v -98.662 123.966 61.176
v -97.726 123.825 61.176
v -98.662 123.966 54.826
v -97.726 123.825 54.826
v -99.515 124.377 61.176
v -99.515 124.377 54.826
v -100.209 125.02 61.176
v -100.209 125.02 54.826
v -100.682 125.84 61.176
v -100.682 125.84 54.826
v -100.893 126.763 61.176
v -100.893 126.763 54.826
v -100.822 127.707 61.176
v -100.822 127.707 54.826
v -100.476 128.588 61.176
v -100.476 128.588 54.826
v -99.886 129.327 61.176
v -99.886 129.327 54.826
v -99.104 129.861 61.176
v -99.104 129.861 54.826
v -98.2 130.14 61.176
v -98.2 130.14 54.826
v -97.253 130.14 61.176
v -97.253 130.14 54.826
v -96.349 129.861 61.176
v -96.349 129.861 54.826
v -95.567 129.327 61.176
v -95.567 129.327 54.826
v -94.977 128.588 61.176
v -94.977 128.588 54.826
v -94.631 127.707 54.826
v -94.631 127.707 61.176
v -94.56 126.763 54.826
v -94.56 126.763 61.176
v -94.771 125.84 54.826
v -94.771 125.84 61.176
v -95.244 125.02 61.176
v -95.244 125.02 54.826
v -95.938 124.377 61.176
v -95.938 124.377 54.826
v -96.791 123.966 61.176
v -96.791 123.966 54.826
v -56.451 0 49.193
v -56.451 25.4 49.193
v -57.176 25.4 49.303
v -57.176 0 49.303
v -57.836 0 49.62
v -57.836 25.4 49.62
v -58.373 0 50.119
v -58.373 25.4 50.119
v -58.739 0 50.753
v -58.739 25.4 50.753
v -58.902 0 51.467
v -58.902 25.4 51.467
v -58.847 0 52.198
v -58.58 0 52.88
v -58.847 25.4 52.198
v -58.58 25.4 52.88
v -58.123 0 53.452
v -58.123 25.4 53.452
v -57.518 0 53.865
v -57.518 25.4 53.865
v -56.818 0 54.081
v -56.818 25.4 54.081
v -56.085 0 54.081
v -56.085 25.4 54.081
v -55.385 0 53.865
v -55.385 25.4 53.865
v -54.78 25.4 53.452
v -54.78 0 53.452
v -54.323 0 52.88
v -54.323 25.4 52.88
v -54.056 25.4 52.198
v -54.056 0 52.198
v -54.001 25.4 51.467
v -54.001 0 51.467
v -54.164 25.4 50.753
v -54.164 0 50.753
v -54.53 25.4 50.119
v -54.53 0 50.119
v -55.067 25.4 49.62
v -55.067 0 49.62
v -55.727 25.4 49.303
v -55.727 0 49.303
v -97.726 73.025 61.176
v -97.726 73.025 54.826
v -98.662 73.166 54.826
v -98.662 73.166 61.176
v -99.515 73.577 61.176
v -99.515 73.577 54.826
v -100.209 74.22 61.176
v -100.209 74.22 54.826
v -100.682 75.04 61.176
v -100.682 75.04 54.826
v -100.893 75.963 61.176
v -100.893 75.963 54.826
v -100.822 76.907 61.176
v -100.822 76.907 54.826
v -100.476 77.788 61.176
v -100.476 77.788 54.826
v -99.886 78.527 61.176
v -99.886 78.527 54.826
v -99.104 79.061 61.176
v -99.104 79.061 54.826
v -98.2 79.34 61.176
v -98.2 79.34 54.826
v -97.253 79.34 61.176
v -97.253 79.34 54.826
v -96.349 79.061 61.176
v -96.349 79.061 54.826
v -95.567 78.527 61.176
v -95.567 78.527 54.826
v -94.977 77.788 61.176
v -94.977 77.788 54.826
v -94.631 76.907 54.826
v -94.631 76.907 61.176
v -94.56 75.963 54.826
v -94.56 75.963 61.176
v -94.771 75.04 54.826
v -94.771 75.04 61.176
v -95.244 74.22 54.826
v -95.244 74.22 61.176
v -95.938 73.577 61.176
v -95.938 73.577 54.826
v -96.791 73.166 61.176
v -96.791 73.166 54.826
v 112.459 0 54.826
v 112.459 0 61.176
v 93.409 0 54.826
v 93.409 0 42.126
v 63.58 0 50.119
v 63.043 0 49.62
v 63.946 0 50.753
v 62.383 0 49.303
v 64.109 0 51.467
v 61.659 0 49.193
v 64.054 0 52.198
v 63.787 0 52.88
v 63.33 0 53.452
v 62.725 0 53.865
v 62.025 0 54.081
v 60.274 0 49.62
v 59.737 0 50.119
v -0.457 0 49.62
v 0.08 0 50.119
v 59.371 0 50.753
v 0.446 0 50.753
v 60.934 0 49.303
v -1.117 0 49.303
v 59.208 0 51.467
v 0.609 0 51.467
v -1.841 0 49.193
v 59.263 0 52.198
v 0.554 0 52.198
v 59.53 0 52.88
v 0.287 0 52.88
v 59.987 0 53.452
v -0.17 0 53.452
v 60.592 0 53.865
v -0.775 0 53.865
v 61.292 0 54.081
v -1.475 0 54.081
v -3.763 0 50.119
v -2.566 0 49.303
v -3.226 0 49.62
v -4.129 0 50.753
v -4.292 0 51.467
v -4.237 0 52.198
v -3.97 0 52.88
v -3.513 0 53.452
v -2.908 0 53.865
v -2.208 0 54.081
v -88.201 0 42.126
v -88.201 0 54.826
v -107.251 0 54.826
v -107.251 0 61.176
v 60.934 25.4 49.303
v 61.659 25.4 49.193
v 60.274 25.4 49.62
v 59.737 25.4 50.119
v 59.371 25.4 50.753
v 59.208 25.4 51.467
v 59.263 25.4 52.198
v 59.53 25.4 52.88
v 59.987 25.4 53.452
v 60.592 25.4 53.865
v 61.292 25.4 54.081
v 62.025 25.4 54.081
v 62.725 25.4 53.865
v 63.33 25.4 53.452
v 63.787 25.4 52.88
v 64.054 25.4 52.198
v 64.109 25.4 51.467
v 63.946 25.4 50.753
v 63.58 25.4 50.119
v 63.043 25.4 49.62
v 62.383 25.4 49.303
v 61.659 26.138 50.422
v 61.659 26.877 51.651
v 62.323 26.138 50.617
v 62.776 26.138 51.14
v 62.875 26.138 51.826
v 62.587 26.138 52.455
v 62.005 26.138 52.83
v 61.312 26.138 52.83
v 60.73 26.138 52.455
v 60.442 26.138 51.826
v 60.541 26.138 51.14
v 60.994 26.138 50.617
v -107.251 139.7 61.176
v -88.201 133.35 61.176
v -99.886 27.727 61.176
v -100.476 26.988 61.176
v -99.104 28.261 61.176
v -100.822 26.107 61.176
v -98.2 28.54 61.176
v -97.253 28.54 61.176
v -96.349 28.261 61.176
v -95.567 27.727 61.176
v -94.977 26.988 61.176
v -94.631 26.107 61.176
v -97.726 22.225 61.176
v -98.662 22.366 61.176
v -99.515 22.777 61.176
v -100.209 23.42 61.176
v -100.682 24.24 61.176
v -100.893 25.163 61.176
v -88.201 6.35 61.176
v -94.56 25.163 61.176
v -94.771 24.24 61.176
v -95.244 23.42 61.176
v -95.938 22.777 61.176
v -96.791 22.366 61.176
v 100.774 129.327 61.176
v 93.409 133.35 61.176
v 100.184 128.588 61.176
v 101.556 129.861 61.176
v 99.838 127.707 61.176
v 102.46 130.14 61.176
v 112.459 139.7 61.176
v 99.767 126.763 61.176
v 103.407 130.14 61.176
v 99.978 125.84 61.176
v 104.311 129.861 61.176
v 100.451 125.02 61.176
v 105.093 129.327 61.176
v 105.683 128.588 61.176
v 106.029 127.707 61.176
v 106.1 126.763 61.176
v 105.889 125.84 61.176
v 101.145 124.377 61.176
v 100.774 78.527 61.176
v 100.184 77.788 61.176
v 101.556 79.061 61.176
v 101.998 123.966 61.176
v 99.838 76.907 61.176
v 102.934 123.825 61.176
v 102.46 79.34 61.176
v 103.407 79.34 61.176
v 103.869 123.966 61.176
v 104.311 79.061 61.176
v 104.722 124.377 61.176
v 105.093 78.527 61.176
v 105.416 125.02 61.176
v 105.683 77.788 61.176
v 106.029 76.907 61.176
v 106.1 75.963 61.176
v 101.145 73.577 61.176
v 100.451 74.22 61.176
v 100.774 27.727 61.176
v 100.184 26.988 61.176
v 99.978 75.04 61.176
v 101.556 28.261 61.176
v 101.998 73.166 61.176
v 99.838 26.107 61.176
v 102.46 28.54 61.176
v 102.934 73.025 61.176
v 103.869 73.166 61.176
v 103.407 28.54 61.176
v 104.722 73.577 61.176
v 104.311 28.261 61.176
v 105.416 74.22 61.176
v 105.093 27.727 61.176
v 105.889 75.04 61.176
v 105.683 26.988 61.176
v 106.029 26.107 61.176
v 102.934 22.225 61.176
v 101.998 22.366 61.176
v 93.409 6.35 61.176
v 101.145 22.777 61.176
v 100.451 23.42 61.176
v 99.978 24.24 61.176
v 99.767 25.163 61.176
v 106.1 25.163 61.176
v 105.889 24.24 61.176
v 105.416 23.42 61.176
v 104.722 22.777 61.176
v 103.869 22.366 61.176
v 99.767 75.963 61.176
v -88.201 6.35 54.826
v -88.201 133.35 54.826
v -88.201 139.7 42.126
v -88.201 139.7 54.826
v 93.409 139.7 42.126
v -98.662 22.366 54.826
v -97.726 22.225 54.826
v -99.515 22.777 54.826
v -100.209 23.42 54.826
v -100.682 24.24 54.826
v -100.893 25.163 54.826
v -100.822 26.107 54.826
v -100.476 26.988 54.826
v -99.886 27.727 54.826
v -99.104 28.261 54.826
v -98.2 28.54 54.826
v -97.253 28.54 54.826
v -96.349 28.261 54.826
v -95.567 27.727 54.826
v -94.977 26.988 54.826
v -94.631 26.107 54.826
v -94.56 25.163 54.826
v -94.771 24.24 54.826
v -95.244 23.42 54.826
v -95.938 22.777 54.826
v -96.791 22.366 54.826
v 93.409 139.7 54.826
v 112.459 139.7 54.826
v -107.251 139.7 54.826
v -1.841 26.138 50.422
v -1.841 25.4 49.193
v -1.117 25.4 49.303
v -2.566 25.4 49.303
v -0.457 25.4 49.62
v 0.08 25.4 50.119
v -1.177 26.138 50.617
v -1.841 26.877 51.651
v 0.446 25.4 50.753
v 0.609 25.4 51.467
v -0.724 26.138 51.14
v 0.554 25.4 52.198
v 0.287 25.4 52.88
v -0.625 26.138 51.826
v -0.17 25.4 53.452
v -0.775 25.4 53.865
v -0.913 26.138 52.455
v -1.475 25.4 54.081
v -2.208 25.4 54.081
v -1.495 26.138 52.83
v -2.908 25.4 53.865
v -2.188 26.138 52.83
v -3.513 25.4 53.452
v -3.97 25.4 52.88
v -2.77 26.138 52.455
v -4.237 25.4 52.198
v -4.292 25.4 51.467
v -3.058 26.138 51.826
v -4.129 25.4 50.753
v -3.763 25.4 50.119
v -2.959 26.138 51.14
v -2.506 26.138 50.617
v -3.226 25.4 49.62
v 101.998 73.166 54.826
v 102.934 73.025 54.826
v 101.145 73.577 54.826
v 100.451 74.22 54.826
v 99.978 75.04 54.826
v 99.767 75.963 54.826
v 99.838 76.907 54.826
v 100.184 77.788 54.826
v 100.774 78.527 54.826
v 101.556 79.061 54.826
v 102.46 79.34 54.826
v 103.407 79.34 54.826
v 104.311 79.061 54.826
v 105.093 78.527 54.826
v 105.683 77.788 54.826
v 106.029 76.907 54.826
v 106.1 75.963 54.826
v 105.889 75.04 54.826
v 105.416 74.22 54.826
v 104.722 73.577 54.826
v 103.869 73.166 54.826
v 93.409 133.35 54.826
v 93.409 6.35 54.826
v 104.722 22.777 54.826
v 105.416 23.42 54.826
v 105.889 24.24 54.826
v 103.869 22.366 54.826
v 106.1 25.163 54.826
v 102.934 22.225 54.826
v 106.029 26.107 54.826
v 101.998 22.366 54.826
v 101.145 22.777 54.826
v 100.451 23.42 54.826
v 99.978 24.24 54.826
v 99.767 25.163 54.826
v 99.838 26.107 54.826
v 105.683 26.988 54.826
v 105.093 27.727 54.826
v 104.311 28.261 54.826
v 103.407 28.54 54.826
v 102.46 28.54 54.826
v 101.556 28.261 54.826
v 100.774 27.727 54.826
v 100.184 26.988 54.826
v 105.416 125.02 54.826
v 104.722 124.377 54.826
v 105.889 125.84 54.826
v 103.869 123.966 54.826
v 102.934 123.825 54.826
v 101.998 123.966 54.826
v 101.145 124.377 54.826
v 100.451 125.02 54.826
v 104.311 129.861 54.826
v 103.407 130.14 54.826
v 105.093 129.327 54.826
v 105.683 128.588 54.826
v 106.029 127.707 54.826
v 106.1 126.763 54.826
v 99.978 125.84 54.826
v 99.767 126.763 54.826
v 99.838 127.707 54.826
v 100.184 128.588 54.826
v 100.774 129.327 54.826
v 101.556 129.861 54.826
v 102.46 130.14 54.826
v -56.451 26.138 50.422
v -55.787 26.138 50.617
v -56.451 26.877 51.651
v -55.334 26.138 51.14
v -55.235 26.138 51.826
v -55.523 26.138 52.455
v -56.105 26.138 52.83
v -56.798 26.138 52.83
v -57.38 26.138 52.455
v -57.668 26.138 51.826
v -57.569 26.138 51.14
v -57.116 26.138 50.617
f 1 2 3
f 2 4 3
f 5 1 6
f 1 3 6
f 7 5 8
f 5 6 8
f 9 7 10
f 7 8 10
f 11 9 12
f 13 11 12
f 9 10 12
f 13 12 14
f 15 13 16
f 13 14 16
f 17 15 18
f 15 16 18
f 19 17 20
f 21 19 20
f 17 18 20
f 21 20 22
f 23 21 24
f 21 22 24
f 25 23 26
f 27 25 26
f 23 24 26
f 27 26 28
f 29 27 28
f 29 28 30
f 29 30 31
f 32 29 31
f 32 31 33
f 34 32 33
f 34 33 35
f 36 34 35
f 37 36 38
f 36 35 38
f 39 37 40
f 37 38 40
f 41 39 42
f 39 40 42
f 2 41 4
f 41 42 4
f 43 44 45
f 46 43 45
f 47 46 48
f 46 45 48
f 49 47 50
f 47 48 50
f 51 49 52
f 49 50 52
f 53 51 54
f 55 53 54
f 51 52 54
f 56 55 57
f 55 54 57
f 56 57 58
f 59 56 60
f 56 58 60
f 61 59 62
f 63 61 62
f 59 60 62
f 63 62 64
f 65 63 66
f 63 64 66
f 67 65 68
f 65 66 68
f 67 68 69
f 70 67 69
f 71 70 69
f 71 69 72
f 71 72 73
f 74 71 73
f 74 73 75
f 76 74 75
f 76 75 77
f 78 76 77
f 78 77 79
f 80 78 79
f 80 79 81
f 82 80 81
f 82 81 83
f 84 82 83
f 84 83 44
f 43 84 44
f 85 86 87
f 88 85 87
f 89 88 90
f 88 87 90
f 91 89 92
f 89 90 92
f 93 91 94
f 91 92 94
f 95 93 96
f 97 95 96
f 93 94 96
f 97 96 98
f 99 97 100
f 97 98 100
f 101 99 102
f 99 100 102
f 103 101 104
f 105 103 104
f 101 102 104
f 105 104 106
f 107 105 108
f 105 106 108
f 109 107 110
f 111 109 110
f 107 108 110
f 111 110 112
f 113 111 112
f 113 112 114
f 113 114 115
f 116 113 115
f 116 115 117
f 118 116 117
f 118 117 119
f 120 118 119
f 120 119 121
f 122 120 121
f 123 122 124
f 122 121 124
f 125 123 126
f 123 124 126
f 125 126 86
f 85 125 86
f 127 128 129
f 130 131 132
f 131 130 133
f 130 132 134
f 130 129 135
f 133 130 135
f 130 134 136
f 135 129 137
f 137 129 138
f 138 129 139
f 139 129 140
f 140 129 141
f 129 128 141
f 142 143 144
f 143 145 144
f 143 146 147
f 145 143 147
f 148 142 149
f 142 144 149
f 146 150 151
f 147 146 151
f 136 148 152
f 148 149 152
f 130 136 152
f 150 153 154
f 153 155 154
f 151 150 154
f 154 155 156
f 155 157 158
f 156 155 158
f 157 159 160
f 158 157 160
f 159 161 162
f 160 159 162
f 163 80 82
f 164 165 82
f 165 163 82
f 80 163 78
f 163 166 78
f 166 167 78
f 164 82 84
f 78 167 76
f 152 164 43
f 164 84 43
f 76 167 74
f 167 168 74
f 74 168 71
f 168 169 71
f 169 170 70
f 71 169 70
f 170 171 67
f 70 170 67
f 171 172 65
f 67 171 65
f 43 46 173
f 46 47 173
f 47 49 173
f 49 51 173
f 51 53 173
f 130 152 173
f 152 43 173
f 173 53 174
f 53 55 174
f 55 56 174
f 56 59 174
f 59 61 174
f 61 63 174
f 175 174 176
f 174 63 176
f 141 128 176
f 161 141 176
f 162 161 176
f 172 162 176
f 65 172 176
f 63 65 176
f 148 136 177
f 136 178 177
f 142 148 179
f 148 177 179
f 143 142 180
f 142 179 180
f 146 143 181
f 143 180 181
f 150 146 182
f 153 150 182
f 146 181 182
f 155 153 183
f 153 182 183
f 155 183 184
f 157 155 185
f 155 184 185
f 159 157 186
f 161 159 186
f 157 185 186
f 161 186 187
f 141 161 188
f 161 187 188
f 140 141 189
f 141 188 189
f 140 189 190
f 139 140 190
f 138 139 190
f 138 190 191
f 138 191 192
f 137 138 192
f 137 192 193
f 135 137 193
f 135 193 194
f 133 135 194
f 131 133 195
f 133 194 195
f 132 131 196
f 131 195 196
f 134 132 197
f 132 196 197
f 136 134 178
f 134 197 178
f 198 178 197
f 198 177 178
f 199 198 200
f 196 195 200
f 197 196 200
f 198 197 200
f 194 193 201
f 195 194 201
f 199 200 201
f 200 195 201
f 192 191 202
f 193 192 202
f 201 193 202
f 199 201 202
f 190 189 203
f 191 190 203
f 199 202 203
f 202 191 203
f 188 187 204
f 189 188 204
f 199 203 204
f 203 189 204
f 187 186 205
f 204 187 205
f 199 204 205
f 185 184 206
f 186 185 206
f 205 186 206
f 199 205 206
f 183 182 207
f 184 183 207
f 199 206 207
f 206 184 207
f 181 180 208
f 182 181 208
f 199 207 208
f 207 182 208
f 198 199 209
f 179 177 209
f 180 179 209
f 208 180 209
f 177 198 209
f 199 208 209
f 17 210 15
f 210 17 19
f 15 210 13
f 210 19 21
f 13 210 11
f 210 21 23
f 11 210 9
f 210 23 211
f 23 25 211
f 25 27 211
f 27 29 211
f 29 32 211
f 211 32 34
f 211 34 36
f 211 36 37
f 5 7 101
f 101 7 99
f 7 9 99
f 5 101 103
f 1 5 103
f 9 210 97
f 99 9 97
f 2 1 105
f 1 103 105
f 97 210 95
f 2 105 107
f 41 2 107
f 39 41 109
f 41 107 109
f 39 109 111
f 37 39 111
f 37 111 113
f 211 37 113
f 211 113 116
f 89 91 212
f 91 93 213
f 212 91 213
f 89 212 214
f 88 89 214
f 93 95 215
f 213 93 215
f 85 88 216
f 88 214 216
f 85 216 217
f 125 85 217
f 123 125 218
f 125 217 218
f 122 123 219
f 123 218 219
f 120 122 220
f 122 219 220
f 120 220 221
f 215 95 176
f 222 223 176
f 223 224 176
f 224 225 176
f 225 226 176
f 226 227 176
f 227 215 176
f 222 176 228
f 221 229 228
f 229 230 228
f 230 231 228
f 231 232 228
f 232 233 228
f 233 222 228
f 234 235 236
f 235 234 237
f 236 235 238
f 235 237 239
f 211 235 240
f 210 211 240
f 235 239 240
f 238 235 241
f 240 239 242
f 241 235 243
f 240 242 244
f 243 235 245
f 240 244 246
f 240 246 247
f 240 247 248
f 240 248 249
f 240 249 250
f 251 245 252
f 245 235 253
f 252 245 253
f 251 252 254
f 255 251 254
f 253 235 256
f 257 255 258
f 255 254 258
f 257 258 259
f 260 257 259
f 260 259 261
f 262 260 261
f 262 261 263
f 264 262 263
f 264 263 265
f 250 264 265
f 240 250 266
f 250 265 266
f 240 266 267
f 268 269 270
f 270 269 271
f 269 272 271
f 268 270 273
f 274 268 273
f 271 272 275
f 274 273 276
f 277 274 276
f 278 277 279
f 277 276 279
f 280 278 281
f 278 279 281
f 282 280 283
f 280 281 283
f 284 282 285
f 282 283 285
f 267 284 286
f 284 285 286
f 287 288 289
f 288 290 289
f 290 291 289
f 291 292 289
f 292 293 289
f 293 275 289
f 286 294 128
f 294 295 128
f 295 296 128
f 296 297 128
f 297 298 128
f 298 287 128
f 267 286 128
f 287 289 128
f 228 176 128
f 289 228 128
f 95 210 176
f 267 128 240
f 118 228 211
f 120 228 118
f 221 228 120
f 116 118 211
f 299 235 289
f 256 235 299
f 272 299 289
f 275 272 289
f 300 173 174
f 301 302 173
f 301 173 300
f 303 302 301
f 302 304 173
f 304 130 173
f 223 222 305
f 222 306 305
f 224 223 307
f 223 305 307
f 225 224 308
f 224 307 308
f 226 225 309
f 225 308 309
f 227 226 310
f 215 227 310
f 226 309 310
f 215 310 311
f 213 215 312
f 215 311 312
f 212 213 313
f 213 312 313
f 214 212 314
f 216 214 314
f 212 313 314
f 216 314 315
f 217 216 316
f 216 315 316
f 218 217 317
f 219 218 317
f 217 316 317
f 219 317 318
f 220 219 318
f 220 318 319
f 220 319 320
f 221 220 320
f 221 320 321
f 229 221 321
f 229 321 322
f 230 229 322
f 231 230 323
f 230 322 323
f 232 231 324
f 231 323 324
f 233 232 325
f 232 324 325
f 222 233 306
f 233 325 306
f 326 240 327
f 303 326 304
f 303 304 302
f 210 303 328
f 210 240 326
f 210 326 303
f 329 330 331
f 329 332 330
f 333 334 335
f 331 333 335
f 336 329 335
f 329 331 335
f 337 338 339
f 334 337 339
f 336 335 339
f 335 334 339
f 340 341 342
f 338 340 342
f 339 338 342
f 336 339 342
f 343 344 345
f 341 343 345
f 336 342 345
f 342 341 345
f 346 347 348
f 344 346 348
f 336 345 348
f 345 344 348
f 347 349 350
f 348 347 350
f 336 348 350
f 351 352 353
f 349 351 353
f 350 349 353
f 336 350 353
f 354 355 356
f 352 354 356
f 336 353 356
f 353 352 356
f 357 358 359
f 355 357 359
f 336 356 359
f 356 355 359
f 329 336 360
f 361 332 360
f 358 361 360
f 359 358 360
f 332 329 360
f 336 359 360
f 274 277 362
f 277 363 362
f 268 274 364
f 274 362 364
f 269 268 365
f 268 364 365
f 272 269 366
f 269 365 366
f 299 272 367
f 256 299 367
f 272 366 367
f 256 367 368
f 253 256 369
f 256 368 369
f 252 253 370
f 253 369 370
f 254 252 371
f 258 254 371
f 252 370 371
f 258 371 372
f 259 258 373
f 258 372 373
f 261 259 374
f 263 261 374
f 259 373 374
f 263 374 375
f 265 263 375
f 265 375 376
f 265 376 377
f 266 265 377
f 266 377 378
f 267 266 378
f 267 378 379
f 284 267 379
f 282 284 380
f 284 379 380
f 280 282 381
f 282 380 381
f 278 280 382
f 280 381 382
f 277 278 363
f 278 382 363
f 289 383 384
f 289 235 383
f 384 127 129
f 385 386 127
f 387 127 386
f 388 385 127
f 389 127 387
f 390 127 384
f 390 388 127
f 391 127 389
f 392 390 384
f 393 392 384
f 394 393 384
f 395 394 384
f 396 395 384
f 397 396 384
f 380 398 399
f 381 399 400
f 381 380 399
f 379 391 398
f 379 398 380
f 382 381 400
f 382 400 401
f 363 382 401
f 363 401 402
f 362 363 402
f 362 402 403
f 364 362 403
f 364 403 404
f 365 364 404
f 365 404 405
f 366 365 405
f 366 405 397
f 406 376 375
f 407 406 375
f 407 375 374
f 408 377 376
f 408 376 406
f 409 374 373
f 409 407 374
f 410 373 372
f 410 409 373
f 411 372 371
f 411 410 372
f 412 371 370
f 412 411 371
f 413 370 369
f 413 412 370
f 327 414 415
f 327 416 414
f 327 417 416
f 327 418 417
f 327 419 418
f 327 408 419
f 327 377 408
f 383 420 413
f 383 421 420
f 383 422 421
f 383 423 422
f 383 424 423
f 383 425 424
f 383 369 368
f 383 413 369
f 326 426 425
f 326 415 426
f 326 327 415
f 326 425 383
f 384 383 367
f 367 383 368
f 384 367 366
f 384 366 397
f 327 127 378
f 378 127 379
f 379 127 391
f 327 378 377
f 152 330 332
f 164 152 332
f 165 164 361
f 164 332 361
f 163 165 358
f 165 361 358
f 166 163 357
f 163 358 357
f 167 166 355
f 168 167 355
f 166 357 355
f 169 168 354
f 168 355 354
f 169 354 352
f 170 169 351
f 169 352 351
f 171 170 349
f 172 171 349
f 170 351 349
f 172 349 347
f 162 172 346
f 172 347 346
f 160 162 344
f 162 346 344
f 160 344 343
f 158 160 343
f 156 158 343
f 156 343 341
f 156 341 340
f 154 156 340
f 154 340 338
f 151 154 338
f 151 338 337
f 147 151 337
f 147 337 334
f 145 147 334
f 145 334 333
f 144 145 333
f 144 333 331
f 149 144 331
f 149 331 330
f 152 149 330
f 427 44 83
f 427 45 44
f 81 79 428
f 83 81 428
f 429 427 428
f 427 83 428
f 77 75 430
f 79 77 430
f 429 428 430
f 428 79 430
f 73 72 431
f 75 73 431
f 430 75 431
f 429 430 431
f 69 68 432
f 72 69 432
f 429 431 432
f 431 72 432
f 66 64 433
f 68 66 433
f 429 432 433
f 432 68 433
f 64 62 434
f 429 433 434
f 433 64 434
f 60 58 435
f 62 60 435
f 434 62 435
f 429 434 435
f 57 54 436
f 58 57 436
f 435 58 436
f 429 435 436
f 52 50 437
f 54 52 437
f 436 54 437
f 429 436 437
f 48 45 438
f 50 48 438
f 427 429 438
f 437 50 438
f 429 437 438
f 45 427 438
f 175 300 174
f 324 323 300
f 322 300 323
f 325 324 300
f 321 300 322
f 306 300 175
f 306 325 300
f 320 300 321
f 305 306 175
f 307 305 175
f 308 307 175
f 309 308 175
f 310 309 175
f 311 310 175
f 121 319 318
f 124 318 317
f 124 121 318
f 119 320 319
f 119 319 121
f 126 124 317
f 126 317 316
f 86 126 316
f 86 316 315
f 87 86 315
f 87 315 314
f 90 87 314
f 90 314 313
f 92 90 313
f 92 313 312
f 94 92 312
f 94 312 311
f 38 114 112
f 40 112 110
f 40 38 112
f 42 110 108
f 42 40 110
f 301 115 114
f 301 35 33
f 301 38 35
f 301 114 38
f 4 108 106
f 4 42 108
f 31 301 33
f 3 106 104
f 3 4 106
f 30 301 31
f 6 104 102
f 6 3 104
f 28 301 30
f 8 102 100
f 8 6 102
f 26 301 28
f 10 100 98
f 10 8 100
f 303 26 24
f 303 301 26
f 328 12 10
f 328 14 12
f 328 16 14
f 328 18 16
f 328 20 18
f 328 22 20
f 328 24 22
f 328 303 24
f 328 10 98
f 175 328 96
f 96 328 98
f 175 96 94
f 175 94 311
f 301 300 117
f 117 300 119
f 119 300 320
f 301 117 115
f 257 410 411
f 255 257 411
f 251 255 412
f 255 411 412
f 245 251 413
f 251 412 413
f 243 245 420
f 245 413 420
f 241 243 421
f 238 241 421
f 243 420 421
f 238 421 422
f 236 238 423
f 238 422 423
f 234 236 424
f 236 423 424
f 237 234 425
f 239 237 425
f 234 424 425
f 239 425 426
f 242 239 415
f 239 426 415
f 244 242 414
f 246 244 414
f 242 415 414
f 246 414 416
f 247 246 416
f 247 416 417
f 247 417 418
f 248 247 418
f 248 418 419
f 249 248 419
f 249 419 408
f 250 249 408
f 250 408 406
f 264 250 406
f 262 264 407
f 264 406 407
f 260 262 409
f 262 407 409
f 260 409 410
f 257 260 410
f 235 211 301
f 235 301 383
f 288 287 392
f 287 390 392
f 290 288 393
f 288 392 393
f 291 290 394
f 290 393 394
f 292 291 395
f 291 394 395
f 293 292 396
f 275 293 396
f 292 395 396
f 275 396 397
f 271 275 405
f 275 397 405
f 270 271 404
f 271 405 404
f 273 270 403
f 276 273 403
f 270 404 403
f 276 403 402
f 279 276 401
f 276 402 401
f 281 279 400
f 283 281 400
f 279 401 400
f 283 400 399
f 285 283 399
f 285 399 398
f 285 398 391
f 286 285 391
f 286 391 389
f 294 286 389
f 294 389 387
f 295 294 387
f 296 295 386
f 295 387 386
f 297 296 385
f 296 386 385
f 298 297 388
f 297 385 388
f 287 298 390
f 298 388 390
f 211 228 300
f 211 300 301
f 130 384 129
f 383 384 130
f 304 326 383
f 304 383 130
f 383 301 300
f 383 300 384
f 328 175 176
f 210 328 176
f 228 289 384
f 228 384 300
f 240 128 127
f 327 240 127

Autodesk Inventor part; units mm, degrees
ref_plane "YZ Plane" through (0, 0, 0) normal (1, 0, 0) x (0, 1, 0)
ref_plane "XZ Plane" through (0, 0, 0) normal (0, 1, 0) x (-1, 0, 0)
ref_plane "XY Plane" through (0, 0, 0) normal (0, 0, 1) x (1, 0, 0)
sketch "Sketch1" plane through (0, 0, 0) normal (0, 1, 0) x (-1, 0, 0)
  line L0 (107.2514, 61.1758) -> (-112.4586, 61.1758)
  line L1 (-112.4586, 61.1758) -> (-112.4586, 42.1258)
  line L2 (-112.4586, 42.1258) -> (107.2514, 42.1258)
  line L3 (107.2514, 42.1258) -> (107.2514, 61.1758)
  point P0 (0, 0)
  dimension "d0" = 219.71
  dimension "d1" = 19.05
extrude "Extrusion1" add sketch "Sketch1" along normal blind 139.7
sketch "Sketch2" plane through (-107.2514, 0, 61.1758) normal (0, 0, 1) x (1, 0, 0)
  line L0 (0, 0) -> (219.71, 0) projected
  line L1 (0, 139.7) -> (219.71, 139.7) projected
  line L2 (0, 0) -> (0, 139.7) projected
  line L3 (219.71, 0) -> (219.71, 139.7) projected
  point P0 (107.2514, 0)
  point P1 (9.525, 76.2)
  point P2 (9.525, 25.4)
  point P3 (210.185, 25.4)
  point P4 (210.185, 76.2)
  dimension "d4" = 0
  dimension "d5" = 0
  dimension "d6" = 0
  dimension "d7" = 0
  dimension "d8" = 25.4
  dimension "d10" = 9.525
  dimension "d11" = 9.525
  dimension "d57" = 50.8
hole "Hole1" at (-97.7264, 76.2, 61.1758) at (-97.7264, 25.4, 61.1758) at (102.9336, 25.4, 61.1758) at (102.9336, 76.2, 61.1758) direction (0, 0, -1) diameter 6.35 end through all
sketch "Sketch3" plane through (-107.2514, 0, 61.1758) normal (0, 0, 1) x (1, 0, 0)
  line L0 (19.05, 133.35) -> (200.66, 133.35)
  line L1 (200.66, 133.35) -> (200.66, 6.35)
  line L2 (200.66, 6.35) -> (19.05, 6.35)
  line L3 (19.05, 6.35) -> (19.05, 133.35)
  line L4 (0, 0) -> (0, 139.7) projected
  line L5 (219.71, 0) -> (219.71, 139.7) projected
  line L6 (219.71, 139.7) -> (0, 139.7) projected
  line L7 (0, 0) -> (219.71, 0) projected
  point P0 (107.2514, 0)
  dimension "d19" = 19.05
  dimension "d20" = 19.05
  dimension "d21" = 6.35
  dimension "d22" = 6.35
extrude "Extrusion2" cut sketch "Sketch3" against normal blind 6.35 contours L0 L1 L2 L3
sketch "Sketch6" plane through (0, 139.7, 0) normal (0, 1, 0) x (1, 0, 0)
  line L0 (-88.2014, -54.8258) -> (-107.2514, -54.8258)
  line L1 (-107.2514, -54.8258) -> (-107.2514, -42.1258)
  line L2 (-107.2514, -42.1258) -> (-88.2014, -42.1258)
  line L3 (-88.2014, -42.1258) -> (-88.2014, -54.8258)
  line L4 (112.4586, -42.1258) -> (-107.2514, -42.1258) projected
  line L5 (-107.2514, -42.1258) -> (-107.2514, -61.1758) projected
  line L6 (112.4586, -54.8258) -> (93.4086, -54.8258)
  line L7 (93.4086, -54.8258) -> (93.4086, -42.1258)
  line L8 (93.4086, -42.1258) -> (112.4586, -42.1258)
  line L9 (112.4586, -42.1258) -> (112.4586, -54.8258)
  line L10 (112.4586, -61.1758) -> (112.4586, -42.1258) projected
  line L11 (-107.2514, -61.1758) -> (112.4586, -61.1758) projected
  point P0 (0, 0)
  dimension "d25" = 0
  dimension "d26" = 12.7
  dimension "d27" = 0
  dimension "d28" = 19.05
  dimension "d32" = 19.05
  dimension "d33" = 0
  dimension "d34" = 6.35
extrude "Extrusion3" cut sketch "Sketch6" against normal blind 254 contours L0 L1 L2 L3 | L4 L9 L6 L7
sketch "Sketch7" plane through (0, 0, 0) normal (0, -1, 0) x (1, 0, 0)
  line L0 (112.4586, 61.1758) -> (112.4586, 42.1258) projected
  line L1 (112.4586, 42.1258) -> (-107.2514, 42.1258) projected
  line L2 (-107.2514, 42.1258) -> (-107.2514, 61.1758) projected
  point P0 (0, 0)
  point P1 (61.6586, 51.6508)
  point P2 (-56.4514, 51.6508)
  point P3 (112.4586, 54.8258)
  point P4 (93.4086, 42.1258)
  point P5 (-88.2014, 42.1258)
  point P6 (-107.2514, 54.8258)
  dimension "d37" = 50.8
  dimension "d38" = 9.525
  dimension "d39" = 50.8
  dimension "d40" = 9.525
hole "Hole2" at (61.6586, 0, 51.6508) at (-56.4514, 0, 51.6508) direction (0, 1, 0) diameter 4.9149 depth 25.4 tip angle 118
sketch "Sketch8" plane through (0, 0, 0) normal (0, -1, 0) x (1, 0, 0)
  line L0 (112.4586, 61.1758) -> (112.4586, 42.1258) projected
  line L1 (112.4586, 42.1258) -> (-107.2514, 42.1258) projected
  point P0 (0, 0)
  point P1 (-1.8414, 51.6508)
  point P2 (-1.8414, 51.6508)
  point P3 (112.4586, 54.8258)
  point P4 (93.4086, 42.1258)
  point P5 (-88.2014, 42.1258)
  dimension "d48" = 114.3
  dimension "d49" = 9.525
hole "Hole3" at (-1.8414, 0, 51.6508) direction (0, 1, 0) diameter 4.9149 depth 25.4 tip angle 118
sketch "Sketch9" plane through (-107.2514, 0, 61.1758) normal (0, 0, 1) x (1, 0, 0)
  circle A0 centre (210.185, 76.2) radius 3.175 projected
  line L0 (219.71, 0) -> (219.71, 139.7) projected
  line L1 (0, 0) -> (0, 139.7) projected
  point P0 (107.2514, 0)
  point P1 (9.525, 127)
  point P2 (210.185, 127)
  dimension "d58" = 0
  dimension "d59" = 50.8
  dimension "d60" = 9.525
  dimension "d61" = 9.525
hole "Hole4" at (-97.7264, 127, 61.1758) at (102.9336, 127, 61.1758) direction (0, 0, -1) diameter 6.35 depth 25.4 tip angle 118
properties part number "TallFrontWall"
